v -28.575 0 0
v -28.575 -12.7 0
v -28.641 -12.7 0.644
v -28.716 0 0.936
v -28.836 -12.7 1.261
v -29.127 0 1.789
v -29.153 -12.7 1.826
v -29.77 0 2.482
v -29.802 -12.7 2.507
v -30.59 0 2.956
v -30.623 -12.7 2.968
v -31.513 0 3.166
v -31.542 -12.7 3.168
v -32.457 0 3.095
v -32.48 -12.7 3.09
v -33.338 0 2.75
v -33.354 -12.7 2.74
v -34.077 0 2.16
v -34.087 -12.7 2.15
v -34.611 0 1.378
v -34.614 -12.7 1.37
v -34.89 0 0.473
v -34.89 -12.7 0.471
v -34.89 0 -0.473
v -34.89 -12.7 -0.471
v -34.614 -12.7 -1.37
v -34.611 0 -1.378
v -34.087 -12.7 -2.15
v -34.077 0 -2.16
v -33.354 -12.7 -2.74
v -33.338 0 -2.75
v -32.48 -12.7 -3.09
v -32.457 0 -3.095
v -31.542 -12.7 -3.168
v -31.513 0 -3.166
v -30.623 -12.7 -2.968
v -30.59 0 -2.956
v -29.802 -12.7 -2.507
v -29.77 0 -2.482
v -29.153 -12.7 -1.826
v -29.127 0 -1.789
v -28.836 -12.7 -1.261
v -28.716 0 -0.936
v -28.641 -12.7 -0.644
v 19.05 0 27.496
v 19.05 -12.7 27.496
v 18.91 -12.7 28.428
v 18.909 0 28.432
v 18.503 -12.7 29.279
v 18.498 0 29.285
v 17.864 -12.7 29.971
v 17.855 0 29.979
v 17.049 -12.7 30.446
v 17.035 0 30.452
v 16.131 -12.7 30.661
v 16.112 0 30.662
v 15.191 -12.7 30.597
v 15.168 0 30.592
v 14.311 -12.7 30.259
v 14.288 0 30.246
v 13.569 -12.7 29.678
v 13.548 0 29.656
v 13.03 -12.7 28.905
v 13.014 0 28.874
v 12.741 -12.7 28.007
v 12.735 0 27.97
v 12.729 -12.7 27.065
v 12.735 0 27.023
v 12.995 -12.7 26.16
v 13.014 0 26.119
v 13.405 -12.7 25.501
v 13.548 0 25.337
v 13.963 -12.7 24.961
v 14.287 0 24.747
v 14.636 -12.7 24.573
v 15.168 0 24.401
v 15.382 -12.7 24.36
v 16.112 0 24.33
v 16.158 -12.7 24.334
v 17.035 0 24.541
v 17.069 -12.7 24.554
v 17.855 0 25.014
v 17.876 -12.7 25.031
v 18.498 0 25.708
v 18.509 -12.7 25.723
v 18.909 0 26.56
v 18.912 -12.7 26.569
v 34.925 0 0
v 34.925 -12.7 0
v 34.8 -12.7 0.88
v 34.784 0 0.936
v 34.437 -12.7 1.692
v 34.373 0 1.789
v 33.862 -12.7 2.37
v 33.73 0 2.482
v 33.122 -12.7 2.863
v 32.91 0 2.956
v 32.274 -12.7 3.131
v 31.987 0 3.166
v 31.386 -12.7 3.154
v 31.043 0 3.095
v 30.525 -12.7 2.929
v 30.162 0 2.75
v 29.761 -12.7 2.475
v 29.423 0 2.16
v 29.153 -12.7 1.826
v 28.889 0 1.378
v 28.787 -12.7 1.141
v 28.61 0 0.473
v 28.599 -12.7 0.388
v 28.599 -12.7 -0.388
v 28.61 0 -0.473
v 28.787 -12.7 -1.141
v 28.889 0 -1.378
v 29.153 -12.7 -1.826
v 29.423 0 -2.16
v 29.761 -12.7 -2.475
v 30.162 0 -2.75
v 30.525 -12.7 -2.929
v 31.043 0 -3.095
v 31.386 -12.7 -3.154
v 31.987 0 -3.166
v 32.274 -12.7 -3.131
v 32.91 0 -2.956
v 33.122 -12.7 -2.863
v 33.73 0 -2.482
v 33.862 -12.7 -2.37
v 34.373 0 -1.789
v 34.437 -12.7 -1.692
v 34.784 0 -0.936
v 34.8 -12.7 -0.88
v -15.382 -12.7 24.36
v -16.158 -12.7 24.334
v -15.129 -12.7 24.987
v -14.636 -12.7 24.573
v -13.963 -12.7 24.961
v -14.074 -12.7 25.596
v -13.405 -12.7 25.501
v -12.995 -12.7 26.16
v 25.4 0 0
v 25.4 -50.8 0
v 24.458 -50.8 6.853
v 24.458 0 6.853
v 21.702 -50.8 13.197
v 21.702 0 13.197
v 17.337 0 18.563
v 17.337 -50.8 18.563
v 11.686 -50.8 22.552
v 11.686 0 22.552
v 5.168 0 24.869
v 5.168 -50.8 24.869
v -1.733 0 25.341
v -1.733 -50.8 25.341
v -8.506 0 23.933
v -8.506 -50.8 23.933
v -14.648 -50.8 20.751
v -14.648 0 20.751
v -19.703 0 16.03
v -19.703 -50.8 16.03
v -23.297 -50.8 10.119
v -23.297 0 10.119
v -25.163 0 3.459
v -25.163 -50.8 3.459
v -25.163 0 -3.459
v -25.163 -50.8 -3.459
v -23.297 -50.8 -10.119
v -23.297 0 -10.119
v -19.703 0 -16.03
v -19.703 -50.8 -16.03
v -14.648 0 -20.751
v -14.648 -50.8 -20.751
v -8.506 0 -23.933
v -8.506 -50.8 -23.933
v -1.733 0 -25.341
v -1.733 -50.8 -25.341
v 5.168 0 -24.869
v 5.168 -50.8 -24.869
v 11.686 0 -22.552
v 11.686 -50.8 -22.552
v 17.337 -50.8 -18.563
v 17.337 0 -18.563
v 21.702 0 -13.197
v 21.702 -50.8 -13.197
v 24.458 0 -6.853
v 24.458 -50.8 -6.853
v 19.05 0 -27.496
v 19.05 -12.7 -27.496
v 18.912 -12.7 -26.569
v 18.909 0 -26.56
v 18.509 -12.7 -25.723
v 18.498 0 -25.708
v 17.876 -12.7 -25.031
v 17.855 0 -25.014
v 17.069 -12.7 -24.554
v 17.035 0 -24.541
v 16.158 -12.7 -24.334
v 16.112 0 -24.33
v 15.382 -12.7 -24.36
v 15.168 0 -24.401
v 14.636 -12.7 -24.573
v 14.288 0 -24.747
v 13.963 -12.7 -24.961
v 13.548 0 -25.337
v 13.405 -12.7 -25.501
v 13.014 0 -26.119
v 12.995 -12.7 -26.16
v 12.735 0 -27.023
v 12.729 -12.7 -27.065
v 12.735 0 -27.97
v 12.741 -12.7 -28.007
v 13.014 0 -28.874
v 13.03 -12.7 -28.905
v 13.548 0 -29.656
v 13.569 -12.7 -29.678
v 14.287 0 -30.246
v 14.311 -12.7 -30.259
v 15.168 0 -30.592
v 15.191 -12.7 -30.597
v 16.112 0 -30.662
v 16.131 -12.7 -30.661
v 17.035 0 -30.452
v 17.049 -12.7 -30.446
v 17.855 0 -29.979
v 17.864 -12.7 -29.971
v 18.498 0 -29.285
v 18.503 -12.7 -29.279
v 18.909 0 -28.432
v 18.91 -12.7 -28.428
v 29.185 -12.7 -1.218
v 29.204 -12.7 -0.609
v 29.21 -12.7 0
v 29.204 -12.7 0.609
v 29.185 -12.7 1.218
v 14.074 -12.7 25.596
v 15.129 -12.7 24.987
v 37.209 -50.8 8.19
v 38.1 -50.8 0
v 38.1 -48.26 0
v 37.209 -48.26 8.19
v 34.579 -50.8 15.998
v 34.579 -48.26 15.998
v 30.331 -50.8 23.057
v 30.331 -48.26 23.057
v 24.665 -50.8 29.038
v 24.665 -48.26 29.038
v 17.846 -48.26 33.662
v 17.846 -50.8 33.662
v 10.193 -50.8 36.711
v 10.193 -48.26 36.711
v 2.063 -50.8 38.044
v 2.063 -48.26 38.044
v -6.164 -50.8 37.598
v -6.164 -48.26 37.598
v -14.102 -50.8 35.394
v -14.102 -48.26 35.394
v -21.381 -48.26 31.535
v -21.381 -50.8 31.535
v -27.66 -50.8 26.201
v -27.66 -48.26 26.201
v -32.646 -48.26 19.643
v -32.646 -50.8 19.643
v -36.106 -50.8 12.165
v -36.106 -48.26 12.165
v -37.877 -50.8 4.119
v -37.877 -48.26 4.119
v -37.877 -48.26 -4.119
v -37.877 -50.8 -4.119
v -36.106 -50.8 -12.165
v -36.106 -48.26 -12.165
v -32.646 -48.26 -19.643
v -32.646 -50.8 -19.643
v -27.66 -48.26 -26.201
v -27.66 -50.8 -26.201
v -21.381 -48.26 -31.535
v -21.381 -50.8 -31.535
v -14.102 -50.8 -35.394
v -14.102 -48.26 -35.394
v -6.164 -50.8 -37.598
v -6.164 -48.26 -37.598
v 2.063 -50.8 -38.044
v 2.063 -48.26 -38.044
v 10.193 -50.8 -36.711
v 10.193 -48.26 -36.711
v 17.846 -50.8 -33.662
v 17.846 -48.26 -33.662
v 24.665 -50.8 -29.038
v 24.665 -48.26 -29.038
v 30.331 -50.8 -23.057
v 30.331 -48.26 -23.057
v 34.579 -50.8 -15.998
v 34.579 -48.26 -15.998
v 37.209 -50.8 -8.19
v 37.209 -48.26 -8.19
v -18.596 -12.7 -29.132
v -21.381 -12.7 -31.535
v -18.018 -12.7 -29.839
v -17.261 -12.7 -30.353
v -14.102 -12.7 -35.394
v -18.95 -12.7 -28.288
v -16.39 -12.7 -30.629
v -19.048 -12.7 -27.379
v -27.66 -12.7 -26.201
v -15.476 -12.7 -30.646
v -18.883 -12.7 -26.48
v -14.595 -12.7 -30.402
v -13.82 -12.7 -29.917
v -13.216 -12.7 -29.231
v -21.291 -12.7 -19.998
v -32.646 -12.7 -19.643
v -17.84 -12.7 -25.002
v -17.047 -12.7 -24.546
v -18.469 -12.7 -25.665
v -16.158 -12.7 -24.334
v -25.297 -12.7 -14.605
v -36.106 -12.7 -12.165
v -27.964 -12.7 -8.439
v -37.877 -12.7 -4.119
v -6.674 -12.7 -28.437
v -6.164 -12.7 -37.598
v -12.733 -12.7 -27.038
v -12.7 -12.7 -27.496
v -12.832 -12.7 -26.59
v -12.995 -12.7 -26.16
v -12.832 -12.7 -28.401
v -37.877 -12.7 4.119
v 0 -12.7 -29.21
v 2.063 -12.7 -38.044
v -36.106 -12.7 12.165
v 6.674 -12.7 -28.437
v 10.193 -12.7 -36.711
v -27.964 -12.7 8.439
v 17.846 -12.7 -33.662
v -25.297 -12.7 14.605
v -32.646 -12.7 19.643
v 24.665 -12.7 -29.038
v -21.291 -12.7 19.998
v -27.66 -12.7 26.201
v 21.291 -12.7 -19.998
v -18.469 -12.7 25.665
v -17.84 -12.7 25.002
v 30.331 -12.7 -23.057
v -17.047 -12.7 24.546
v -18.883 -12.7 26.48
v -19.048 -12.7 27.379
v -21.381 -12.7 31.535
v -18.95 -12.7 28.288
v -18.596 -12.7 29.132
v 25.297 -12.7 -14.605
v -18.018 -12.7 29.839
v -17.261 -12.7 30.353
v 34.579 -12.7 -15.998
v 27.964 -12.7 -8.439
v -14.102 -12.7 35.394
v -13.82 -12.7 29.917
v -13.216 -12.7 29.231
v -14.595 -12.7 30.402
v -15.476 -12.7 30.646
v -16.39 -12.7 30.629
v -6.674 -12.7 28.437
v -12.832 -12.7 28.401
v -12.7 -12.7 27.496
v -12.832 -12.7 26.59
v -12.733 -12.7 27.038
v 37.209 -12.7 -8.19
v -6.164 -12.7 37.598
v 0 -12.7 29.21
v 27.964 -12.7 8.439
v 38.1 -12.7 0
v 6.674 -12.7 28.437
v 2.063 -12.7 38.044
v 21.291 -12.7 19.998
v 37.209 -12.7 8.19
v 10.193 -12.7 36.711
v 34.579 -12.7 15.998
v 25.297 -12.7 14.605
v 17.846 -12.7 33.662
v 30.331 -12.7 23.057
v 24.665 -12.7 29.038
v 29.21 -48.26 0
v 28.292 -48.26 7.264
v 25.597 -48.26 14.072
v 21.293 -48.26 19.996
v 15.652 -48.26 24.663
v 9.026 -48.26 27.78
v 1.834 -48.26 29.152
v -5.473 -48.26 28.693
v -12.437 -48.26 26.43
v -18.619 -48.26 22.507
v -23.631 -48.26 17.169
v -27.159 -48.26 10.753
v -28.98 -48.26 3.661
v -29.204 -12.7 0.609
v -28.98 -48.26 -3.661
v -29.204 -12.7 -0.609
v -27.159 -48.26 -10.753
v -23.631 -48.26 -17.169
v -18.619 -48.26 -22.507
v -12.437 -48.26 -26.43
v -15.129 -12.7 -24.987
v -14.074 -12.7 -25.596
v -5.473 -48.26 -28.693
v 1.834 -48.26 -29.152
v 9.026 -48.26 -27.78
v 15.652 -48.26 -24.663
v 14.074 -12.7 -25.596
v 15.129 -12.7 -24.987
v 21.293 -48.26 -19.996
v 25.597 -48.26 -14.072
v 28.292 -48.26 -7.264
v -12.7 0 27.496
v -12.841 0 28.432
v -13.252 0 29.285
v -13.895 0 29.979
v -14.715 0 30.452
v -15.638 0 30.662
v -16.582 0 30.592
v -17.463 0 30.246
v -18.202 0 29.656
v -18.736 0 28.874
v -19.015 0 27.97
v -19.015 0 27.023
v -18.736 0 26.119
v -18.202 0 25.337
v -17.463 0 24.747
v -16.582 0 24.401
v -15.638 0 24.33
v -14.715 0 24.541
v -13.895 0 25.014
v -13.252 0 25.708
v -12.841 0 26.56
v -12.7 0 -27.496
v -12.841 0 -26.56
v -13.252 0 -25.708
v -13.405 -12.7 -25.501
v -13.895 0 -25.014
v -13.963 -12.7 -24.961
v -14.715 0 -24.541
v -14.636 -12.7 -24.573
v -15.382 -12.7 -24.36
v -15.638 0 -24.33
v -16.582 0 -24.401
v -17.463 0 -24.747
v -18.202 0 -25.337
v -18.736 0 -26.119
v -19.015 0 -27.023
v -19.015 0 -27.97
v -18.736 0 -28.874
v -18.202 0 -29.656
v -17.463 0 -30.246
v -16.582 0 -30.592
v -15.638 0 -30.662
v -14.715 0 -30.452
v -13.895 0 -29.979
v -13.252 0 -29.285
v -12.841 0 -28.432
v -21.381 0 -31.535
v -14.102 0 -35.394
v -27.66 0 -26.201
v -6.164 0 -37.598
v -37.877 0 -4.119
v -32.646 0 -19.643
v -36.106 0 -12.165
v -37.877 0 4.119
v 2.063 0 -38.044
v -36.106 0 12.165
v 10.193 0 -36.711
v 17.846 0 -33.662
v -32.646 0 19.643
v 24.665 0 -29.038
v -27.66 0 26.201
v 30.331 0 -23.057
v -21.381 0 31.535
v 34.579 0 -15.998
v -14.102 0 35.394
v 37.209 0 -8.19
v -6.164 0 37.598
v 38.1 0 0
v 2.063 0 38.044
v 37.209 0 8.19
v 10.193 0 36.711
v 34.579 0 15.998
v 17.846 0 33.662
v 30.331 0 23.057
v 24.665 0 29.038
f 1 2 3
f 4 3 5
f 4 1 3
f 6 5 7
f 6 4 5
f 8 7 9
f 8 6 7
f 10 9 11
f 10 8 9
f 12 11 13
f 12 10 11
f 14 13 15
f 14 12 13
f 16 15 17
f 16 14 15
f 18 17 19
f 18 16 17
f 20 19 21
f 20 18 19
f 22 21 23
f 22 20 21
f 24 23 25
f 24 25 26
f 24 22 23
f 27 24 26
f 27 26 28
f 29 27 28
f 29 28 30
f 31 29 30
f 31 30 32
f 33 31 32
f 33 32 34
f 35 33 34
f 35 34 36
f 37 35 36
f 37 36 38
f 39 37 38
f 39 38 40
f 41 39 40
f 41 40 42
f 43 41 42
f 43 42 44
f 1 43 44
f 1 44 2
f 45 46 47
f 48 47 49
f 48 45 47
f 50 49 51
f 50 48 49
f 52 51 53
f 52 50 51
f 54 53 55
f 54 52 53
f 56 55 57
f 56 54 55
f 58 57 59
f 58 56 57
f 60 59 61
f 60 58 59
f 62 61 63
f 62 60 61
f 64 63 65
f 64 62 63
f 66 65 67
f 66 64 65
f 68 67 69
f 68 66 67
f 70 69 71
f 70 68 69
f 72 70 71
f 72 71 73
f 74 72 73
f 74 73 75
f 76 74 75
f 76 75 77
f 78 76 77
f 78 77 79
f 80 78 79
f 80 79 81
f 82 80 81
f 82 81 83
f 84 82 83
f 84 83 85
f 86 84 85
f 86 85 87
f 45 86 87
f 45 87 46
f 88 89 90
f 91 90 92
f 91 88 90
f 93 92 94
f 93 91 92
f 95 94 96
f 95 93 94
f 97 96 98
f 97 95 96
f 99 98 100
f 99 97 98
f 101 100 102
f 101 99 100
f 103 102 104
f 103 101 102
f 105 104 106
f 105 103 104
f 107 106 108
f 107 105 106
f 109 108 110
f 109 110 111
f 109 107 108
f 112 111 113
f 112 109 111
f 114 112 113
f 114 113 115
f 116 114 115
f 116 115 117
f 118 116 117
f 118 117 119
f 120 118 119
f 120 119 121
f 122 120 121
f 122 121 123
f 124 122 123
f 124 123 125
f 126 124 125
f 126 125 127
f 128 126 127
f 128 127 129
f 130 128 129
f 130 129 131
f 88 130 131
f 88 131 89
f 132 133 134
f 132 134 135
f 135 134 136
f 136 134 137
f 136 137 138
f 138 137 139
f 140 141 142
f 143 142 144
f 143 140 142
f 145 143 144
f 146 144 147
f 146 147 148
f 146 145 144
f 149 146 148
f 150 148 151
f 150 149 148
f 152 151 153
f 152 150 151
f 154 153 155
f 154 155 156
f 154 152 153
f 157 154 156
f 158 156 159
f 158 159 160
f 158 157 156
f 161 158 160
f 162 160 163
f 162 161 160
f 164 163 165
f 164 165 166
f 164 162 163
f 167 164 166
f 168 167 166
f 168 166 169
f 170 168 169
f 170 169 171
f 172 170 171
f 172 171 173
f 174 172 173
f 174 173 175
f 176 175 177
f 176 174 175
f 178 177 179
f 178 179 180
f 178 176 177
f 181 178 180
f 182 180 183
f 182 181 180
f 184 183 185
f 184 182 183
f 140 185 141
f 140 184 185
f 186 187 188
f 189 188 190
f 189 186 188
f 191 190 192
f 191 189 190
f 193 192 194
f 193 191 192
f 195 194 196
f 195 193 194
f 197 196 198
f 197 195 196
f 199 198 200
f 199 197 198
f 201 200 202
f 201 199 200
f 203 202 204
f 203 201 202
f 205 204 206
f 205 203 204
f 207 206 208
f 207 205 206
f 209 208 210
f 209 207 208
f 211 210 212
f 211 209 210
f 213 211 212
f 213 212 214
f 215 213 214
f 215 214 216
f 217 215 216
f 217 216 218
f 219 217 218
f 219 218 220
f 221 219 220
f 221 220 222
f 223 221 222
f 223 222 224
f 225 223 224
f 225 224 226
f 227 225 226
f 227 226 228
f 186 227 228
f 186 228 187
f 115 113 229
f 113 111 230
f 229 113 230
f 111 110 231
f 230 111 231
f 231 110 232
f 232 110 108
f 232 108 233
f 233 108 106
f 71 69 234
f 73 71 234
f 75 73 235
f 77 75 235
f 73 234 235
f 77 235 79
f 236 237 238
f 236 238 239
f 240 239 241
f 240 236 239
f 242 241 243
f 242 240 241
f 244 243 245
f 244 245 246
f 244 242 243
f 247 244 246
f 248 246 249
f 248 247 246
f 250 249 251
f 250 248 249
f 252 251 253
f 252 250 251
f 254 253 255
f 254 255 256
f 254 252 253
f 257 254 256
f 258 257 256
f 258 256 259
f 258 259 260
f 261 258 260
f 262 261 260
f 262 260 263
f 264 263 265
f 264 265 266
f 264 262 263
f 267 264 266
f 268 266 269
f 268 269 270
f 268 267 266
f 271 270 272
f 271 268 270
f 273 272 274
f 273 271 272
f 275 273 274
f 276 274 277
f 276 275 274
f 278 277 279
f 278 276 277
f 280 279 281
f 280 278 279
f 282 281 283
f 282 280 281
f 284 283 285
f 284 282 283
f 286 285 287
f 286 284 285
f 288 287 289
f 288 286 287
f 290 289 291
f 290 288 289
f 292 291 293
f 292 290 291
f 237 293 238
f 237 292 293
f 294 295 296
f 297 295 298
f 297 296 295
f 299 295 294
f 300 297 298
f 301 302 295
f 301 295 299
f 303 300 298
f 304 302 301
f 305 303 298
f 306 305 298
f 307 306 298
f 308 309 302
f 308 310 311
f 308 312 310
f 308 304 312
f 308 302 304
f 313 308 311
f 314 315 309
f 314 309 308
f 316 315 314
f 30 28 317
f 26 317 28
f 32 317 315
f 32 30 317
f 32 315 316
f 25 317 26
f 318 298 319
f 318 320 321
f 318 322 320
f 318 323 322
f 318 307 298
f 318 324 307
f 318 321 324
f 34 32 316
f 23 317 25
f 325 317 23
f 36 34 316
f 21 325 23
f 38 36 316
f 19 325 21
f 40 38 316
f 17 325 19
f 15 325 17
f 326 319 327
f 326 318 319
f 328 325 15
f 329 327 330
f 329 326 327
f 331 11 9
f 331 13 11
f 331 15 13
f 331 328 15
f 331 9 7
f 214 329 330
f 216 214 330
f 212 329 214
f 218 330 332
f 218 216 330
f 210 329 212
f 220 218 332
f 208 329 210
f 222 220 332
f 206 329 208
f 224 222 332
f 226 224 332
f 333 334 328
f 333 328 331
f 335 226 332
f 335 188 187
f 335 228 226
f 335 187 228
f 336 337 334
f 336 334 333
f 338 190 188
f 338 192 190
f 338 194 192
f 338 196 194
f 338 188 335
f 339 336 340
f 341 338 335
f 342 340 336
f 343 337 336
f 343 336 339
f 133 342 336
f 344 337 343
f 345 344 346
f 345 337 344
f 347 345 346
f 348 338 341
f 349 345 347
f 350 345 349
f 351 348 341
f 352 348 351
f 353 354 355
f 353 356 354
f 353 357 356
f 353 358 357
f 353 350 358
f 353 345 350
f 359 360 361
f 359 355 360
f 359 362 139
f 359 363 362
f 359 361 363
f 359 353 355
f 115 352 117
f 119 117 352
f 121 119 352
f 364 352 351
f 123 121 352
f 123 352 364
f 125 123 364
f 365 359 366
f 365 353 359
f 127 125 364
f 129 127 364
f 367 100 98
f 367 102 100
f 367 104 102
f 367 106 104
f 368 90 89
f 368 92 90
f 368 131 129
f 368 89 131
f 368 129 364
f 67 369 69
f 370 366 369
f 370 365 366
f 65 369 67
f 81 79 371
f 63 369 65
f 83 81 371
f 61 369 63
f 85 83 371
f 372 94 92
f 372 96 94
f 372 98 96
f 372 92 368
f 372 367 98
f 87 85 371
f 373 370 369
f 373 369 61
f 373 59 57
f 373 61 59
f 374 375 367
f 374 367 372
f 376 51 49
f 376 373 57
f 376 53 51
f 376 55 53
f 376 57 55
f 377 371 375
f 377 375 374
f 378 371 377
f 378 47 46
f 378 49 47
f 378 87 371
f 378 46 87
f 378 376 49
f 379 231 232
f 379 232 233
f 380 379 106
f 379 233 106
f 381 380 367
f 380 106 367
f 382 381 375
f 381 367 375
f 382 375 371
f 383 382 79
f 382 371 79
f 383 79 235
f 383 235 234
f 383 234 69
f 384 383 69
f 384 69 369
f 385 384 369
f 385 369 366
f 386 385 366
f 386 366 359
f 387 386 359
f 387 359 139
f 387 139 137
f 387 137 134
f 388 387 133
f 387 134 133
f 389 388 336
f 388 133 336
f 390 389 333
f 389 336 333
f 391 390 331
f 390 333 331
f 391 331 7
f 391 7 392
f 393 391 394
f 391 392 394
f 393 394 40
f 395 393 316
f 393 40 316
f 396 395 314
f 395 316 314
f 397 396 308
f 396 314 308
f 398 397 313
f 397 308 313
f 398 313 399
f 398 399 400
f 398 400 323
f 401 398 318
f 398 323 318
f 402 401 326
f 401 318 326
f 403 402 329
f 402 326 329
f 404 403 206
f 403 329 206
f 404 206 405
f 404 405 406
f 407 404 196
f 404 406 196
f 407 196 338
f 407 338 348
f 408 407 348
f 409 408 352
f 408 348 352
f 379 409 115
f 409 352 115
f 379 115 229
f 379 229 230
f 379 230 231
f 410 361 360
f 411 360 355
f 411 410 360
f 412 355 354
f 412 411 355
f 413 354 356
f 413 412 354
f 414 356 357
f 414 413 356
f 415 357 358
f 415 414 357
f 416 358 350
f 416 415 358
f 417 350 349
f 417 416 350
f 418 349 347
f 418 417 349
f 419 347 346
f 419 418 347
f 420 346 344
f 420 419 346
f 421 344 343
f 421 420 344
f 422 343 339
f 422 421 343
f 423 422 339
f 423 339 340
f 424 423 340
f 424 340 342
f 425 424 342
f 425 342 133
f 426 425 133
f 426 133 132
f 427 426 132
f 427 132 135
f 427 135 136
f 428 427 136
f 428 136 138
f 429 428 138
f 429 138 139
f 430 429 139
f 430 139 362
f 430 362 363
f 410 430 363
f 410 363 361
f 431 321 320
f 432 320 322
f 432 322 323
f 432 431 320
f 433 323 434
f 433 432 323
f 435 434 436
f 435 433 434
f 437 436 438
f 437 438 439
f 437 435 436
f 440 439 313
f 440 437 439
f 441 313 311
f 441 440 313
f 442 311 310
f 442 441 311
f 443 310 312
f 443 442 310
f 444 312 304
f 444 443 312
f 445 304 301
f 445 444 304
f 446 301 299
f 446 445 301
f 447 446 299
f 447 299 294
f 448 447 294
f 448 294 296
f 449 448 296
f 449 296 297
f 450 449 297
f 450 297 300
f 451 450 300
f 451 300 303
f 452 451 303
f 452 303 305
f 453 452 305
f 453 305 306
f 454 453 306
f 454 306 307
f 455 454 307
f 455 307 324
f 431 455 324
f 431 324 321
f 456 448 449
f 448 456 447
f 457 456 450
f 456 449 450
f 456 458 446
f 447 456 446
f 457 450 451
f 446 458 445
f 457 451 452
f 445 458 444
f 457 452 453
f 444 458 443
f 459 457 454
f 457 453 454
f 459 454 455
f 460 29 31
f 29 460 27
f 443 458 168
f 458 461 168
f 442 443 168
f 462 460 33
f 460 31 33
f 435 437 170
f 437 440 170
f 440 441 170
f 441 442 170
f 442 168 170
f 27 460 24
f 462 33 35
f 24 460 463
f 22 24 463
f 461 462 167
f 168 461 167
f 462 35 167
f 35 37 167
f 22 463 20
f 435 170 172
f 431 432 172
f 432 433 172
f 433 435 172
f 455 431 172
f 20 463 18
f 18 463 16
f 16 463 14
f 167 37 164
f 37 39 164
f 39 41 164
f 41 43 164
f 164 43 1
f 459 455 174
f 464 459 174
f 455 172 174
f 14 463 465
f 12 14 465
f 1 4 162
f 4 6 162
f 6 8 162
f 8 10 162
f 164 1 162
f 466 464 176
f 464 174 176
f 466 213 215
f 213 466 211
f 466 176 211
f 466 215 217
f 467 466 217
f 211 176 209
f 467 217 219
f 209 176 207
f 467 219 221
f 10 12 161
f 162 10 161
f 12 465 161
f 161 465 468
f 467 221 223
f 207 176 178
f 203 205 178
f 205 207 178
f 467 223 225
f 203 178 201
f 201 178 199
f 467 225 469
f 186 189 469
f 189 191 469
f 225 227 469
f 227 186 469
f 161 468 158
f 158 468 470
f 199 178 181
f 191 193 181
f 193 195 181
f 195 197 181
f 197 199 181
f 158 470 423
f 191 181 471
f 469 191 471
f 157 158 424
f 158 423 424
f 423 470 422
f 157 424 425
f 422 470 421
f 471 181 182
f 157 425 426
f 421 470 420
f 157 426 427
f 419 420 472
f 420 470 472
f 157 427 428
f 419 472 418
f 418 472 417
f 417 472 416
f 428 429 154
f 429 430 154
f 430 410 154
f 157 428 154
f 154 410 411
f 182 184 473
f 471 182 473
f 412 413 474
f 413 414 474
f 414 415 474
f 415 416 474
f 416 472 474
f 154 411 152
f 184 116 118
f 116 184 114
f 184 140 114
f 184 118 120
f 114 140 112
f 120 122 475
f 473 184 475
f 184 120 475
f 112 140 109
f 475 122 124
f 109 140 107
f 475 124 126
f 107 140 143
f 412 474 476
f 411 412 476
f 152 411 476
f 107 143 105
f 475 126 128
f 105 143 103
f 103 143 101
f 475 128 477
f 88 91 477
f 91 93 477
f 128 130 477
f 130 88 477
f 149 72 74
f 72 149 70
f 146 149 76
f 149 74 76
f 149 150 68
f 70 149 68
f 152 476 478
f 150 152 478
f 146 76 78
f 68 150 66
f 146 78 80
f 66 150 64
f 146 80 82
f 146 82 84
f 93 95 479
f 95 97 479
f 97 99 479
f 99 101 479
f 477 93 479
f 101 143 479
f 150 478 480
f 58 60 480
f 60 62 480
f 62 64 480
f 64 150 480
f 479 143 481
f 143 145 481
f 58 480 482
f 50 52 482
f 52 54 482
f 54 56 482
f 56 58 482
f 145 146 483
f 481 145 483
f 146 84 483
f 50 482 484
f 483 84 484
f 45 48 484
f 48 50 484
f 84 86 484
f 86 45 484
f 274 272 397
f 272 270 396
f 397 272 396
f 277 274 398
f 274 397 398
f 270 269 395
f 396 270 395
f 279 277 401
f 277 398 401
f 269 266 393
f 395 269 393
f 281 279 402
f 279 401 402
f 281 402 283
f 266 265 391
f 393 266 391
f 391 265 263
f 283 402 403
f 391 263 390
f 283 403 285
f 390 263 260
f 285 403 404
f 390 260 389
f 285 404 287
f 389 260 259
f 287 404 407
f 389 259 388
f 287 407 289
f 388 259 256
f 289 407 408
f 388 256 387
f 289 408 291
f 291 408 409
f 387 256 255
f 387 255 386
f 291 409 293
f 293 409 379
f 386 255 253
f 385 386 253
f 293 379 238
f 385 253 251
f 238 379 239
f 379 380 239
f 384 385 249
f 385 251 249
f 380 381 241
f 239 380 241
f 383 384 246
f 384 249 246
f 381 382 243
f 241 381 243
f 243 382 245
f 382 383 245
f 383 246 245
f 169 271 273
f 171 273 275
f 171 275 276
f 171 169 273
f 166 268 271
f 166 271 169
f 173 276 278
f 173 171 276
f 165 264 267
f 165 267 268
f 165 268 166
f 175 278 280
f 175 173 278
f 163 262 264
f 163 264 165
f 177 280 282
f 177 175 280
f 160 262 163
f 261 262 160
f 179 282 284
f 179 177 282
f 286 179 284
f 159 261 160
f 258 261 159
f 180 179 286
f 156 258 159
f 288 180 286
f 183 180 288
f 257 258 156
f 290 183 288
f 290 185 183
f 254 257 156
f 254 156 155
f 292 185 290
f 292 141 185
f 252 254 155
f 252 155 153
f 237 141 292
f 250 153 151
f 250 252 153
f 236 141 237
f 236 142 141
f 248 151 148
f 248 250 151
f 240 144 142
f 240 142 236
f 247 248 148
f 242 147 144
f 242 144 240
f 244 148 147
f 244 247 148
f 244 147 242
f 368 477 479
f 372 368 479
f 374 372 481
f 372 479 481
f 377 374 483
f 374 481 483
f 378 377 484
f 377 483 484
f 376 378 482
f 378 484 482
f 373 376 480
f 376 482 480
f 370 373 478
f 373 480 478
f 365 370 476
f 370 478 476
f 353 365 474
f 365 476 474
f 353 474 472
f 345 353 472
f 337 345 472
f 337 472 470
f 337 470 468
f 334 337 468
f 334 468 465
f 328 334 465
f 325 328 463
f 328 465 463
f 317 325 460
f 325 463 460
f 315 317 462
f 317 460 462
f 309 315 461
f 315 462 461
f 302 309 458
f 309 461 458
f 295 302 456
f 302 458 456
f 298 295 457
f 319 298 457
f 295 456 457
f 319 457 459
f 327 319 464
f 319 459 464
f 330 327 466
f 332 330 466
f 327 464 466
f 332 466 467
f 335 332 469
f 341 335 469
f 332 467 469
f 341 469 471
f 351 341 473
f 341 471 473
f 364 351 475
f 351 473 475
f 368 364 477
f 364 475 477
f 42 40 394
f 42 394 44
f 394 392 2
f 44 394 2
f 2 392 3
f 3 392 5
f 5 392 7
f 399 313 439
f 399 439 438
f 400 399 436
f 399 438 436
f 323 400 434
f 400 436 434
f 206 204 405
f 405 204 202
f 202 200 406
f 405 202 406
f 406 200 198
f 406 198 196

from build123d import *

# Parameters (mm, degrees)
F0_R     = 29.21
F0_R_2   = 25.4
F1_DEPTH = 50.8
F0_R_3   = 38.1
F2_DEPTH = 12.7
F3_R     = 3.175
F4_DEPTH = 12.7
F5_R     = 38.1
F5_R_2   = 25.4
F6_DEPTH = 2.54


with BuildPart() as f1:
    # F0 (on Front) → F1 (new body)
    with BuildSketch(Plane.XZ):
        Circle(F0_R)
        Circle(F0_R_2, mode=Mode.SUBTRACT)
    extrude(amount=F1_DEPTH)

    # F0 (on Front) → F2 (join)
    with BuildSketch(Plane.XZ):
        Circle(F0_R_3)
        Circle(F0_R, mode=Mode.SUBTRACT)
    extrude(amount=F2_DEPTH)

    # F3 (on face) → F4 (cut)
    with BuildSketch(Plane.XZ):
        with Locations((-31.75, 0)):
            Circle(F3_R)
        with Locations((-15.875, -27.496307)):
            Circle(F3_R)
        with Locations((15.875, -27.496307)):
            Circle(F3_R)
        with Locations((31.75, 0)):
            Circle(F3_R)
        with Locations((15.875, 27.496307)):
            Circle(F3_R)
        with Locations((-15.875, 27.496307)):
            Circle(F3_R)
    extrude(amount=F4_DEPTH, mode=Mode.SUBTRACT)

    # F5 (on face) → F6 (join)
    with BuildSketch(Plane.XZ.offset(50.8)):
        Circle(F5_R)
        Circle(F5_R_2, mode=Mode.SUBTRACT)
    extrude(amount=-F6_DEPTH)


solid = f1.part
